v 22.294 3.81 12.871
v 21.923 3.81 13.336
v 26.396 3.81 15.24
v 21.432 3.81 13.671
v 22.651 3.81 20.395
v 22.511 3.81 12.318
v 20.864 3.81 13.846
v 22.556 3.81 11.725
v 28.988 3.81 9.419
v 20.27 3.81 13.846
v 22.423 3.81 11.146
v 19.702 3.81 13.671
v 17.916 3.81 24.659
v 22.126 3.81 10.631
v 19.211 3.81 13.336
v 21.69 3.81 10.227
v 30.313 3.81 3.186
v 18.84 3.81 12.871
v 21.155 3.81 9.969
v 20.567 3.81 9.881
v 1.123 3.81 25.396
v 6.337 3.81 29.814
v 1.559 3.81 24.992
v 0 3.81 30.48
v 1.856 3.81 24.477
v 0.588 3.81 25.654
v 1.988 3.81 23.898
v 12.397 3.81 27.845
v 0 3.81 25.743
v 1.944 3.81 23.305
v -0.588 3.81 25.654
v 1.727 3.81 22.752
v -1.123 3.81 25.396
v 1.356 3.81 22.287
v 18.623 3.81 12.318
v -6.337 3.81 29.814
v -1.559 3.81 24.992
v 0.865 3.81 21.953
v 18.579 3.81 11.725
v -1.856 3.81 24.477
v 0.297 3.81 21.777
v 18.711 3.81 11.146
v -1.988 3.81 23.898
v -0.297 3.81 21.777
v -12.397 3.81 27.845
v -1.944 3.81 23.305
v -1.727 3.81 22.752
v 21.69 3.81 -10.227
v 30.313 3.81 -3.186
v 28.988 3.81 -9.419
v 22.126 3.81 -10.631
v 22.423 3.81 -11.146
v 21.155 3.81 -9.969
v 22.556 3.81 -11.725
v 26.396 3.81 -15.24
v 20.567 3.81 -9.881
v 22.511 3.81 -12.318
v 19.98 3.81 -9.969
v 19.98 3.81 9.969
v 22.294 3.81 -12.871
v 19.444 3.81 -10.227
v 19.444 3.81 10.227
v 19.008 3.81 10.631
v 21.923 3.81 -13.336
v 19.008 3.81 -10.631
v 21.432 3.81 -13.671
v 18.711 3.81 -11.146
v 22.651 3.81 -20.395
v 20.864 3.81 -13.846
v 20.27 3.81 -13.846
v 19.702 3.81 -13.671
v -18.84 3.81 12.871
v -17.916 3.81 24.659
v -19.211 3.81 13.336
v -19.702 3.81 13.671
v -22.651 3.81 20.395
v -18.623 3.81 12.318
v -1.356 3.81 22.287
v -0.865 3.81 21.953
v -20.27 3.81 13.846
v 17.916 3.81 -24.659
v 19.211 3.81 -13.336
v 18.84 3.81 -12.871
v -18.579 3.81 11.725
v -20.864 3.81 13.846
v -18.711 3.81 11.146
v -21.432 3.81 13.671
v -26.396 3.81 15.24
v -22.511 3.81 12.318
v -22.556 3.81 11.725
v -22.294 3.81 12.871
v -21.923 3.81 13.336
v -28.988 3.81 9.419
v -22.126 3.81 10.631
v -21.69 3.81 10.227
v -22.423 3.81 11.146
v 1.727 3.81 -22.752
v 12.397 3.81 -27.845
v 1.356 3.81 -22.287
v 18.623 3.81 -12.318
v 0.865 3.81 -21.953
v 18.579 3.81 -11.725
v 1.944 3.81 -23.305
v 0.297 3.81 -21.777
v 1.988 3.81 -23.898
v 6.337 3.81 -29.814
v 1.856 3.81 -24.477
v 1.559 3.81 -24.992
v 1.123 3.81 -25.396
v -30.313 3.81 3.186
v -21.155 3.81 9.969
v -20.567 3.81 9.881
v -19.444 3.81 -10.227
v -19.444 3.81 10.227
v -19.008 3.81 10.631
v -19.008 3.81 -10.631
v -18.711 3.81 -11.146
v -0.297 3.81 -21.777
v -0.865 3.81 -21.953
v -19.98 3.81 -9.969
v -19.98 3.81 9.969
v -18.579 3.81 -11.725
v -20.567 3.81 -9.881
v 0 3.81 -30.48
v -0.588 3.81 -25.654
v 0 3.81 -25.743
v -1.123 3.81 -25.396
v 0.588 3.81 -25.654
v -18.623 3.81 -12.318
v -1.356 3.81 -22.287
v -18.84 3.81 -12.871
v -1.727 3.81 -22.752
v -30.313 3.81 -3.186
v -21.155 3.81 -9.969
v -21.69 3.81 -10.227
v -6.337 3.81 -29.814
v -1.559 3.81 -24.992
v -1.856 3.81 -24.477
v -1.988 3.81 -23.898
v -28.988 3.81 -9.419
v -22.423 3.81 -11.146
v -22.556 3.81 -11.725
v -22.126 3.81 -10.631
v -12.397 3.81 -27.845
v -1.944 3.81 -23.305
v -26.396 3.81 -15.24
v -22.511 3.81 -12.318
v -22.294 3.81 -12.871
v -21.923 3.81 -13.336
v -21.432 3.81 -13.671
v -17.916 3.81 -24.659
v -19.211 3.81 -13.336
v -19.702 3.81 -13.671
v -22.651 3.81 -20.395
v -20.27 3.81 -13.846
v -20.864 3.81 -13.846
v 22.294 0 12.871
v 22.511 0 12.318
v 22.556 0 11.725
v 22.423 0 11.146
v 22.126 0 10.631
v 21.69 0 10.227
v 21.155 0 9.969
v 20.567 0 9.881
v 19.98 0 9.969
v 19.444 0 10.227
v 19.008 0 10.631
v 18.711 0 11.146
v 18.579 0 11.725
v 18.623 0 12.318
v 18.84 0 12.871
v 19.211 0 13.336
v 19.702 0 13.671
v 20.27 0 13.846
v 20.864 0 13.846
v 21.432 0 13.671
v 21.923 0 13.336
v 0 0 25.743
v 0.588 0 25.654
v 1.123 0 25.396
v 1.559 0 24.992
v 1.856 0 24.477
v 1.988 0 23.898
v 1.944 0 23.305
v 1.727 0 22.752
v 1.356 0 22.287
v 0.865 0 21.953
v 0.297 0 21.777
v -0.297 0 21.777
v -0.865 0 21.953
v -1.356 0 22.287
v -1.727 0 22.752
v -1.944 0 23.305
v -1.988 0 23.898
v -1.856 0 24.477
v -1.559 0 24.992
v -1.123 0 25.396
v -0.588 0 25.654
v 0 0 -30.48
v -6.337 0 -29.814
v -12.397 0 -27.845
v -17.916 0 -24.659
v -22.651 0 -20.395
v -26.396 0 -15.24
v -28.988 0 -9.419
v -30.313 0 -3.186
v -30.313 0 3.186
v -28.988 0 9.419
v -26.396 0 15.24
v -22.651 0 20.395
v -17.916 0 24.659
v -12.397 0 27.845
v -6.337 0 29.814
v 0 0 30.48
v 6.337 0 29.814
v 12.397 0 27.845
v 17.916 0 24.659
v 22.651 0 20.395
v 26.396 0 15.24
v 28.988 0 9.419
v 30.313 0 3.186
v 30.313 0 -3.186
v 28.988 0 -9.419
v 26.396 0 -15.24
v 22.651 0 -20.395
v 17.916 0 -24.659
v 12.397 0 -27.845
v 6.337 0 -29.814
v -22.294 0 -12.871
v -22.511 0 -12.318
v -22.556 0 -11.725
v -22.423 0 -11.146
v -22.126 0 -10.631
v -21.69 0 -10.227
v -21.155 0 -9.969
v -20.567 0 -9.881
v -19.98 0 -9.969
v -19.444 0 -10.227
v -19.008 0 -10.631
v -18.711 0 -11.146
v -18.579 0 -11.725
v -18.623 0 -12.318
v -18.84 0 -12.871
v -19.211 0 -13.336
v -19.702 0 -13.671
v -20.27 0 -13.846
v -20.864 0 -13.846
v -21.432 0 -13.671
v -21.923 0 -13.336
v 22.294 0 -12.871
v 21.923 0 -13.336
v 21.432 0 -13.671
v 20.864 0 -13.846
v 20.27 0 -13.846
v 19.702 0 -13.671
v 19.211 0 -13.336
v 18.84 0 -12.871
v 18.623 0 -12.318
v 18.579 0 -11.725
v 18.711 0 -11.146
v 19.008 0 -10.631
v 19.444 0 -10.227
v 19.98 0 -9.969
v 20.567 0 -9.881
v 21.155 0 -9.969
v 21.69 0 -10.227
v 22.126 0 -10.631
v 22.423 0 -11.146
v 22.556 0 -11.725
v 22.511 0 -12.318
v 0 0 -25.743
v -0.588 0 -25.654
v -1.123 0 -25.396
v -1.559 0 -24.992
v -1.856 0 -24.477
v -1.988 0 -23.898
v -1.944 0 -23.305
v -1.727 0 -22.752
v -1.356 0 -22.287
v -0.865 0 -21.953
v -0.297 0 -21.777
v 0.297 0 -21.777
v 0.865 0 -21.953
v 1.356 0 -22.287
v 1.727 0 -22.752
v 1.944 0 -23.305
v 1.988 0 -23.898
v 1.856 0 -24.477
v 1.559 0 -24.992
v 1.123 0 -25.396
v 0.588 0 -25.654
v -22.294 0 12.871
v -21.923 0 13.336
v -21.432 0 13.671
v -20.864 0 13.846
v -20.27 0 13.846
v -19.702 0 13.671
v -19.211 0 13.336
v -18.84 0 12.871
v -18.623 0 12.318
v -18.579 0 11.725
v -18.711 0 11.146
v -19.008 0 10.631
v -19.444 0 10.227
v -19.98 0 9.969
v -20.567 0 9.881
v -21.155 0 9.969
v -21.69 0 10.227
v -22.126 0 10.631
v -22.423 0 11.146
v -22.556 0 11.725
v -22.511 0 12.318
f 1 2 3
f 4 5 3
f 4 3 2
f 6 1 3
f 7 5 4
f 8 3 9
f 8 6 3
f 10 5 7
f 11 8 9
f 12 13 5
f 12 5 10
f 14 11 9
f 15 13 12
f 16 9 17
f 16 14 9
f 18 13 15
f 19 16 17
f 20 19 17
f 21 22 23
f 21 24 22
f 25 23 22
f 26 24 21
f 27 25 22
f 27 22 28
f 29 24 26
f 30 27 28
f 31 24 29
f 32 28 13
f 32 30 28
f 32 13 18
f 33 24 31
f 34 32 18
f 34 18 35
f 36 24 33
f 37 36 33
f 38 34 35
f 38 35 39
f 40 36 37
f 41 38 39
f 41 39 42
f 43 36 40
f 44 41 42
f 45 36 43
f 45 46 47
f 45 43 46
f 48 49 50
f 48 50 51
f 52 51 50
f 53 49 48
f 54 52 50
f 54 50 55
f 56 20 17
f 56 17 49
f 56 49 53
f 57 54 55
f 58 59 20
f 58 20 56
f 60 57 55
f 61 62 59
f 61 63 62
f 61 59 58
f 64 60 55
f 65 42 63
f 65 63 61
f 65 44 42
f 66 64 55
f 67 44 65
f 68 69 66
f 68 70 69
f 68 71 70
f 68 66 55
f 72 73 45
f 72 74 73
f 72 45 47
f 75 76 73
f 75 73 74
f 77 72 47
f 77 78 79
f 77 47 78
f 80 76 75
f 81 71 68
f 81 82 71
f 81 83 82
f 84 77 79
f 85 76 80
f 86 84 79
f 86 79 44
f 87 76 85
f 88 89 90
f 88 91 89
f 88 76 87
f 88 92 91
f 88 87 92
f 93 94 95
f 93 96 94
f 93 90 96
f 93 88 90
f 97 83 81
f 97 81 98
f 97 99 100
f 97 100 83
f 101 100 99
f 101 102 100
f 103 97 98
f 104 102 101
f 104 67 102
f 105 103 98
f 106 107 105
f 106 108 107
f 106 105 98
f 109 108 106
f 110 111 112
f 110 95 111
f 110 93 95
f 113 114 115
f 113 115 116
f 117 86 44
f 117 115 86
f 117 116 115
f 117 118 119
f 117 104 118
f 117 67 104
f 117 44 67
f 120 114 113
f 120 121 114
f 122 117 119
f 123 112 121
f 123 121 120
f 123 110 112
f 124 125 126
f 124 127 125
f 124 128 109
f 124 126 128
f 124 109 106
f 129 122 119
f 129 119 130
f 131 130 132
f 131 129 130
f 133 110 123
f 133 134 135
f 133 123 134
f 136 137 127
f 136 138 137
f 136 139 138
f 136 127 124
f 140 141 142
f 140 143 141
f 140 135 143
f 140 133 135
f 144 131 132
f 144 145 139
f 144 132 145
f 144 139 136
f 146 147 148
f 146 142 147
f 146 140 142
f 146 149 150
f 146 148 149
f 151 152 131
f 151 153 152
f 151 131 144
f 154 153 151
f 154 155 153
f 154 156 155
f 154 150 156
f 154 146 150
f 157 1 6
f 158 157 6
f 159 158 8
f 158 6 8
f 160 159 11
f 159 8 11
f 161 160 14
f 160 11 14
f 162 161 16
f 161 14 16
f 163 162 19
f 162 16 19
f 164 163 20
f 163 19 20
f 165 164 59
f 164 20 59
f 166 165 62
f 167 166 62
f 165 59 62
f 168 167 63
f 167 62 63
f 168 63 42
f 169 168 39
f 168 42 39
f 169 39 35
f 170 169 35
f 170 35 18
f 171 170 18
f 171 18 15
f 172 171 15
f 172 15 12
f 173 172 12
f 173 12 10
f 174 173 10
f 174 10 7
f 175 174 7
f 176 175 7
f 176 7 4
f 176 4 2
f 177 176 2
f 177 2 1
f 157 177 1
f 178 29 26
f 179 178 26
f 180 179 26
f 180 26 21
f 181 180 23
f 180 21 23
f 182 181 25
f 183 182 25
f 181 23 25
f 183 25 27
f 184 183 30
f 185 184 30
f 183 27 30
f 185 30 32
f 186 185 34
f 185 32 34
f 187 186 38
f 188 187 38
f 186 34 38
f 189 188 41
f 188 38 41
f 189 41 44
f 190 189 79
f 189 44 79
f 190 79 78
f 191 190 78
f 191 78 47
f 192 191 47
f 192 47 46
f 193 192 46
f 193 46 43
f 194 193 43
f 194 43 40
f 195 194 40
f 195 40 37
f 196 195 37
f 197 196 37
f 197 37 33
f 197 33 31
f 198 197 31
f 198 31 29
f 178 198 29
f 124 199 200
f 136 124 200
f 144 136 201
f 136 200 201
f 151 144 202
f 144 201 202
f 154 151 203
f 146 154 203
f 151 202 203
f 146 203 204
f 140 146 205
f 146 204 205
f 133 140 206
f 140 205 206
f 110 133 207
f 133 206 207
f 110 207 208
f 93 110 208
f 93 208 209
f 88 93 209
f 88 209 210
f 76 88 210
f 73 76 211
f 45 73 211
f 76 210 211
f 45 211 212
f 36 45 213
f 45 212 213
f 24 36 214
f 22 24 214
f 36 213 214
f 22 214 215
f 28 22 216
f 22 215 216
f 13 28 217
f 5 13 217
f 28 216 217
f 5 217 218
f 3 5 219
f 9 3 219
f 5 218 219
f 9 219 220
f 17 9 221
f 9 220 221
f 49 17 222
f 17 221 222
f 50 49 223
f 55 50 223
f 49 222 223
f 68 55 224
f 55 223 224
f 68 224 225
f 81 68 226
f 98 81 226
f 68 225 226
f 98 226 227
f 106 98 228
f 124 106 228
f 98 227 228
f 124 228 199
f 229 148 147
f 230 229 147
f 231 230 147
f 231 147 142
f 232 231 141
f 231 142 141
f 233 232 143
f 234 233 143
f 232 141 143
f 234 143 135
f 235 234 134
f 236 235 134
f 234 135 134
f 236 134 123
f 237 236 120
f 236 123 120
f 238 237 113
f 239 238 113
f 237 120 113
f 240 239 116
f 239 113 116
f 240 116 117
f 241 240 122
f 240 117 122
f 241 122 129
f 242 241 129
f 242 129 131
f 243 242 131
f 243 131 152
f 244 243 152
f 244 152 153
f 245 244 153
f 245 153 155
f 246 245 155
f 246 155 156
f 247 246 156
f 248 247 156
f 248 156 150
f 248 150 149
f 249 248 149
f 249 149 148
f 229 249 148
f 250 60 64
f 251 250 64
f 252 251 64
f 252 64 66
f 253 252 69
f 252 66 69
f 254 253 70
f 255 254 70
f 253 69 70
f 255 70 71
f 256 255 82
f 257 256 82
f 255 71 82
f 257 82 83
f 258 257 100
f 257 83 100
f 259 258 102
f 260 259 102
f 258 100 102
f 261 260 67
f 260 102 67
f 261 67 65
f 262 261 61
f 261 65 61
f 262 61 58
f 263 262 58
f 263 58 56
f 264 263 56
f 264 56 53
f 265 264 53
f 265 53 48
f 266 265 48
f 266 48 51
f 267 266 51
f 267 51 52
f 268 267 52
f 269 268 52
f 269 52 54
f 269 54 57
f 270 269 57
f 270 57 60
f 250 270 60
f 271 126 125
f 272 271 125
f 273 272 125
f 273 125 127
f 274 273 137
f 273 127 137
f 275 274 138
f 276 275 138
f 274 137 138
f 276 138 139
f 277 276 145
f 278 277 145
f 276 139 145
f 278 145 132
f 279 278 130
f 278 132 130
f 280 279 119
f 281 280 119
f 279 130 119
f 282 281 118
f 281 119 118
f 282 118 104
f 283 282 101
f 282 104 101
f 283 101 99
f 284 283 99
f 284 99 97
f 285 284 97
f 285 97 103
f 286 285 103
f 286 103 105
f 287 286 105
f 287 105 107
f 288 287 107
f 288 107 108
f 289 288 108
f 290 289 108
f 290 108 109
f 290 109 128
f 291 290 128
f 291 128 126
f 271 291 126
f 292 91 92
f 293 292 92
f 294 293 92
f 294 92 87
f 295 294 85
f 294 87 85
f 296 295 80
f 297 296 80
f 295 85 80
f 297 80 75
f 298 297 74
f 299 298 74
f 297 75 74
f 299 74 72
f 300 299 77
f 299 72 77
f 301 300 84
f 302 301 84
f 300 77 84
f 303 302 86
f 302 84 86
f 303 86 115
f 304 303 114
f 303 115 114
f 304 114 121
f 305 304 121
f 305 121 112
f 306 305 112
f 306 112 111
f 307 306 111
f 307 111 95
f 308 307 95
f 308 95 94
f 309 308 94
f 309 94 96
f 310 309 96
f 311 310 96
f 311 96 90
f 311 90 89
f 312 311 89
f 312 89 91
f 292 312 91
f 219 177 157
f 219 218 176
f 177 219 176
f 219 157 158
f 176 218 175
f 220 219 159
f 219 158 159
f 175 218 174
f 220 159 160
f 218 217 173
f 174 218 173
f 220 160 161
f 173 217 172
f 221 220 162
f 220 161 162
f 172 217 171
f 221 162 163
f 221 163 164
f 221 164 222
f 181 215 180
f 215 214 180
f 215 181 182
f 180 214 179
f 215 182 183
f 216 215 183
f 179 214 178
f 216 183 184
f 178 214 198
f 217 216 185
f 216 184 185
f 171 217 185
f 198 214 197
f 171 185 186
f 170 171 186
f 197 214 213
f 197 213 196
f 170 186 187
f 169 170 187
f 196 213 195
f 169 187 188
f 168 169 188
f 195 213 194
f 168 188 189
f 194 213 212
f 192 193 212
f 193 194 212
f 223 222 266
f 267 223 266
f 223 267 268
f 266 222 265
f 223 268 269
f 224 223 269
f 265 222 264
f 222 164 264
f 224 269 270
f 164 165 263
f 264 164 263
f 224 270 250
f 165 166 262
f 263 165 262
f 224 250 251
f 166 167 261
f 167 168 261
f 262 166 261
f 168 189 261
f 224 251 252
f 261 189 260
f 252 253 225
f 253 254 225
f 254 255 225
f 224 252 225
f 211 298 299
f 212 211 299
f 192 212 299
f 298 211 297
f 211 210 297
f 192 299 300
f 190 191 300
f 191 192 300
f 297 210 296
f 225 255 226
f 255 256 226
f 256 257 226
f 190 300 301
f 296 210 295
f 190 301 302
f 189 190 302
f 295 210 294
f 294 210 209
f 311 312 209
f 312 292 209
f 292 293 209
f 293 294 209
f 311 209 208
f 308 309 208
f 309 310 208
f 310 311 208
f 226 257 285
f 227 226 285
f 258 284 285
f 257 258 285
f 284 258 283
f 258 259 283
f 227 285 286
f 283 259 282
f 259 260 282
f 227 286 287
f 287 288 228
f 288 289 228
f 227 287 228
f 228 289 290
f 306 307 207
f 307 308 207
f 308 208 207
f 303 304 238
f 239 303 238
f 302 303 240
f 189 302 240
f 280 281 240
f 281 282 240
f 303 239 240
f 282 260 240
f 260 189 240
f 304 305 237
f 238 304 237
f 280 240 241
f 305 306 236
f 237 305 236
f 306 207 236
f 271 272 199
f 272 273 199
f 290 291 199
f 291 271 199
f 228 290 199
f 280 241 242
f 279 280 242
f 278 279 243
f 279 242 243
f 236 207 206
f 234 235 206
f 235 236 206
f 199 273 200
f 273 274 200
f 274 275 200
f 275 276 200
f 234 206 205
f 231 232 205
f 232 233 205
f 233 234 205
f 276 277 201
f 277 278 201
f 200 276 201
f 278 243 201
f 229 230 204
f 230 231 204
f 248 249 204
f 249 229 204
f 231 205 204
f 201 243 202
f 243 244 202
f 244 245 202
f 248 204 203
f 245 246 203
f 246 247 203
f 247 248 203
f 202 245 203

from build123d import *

# Parameters (mm, degrees)
SKETCH1_R           = 30.48
BOSS_EXTRUDE1_DEPTH = 3.81
SKETCH2_R           = 1.9939
CUT_EXTRUDE1_DEPTH  = 44.273281595
CIRPATTERN1_COUNT   = 6


with BuildPart() as part:
    # Sketch1 → Boss-Extrude1 (new body)
    with BuildSketch(Plane(origin=(0, 0, 0), x_dir=(1, 0, 0), z_dir=(0, 1, 0))):
        with Locations(Location((0, 0, 0), (0, 0, 90))):
            Circle(SKETCH1_R)
    extrude(amount=BOSS_EXTRUDE1_DEPTH)

    # Sketch2 → Cut-Extrude1 (cut, through all)
    with BuildSketch(Plane(origin=(0, 3.81, 0), x_dir=(1, 0, 0), z_dir=(0, 1, 0))):
        with Locations(Location((0, -23.749, 0), (0, 0, 270))):
            Circle(SKETCH2_R)
    cut_extrude1 = extrude(amount=-CUT_EXTRUDE1_DEPTH, mode=Mode.SUBTRACT)

    # CirPattern1: Cut-Extrude1 ×6 about axis
    cirpattern1_axis = Axis((0, 0, 0), (0, 1, 0))
    for i in range(1, CIRPATTERN1_COUNT):
        add(cut_extrude1.rotate(cirpattern1_axis, i * 360 / CIRPATTERN1_COUNT), mode=Mode.SUBTRACT)


solid = part.part
